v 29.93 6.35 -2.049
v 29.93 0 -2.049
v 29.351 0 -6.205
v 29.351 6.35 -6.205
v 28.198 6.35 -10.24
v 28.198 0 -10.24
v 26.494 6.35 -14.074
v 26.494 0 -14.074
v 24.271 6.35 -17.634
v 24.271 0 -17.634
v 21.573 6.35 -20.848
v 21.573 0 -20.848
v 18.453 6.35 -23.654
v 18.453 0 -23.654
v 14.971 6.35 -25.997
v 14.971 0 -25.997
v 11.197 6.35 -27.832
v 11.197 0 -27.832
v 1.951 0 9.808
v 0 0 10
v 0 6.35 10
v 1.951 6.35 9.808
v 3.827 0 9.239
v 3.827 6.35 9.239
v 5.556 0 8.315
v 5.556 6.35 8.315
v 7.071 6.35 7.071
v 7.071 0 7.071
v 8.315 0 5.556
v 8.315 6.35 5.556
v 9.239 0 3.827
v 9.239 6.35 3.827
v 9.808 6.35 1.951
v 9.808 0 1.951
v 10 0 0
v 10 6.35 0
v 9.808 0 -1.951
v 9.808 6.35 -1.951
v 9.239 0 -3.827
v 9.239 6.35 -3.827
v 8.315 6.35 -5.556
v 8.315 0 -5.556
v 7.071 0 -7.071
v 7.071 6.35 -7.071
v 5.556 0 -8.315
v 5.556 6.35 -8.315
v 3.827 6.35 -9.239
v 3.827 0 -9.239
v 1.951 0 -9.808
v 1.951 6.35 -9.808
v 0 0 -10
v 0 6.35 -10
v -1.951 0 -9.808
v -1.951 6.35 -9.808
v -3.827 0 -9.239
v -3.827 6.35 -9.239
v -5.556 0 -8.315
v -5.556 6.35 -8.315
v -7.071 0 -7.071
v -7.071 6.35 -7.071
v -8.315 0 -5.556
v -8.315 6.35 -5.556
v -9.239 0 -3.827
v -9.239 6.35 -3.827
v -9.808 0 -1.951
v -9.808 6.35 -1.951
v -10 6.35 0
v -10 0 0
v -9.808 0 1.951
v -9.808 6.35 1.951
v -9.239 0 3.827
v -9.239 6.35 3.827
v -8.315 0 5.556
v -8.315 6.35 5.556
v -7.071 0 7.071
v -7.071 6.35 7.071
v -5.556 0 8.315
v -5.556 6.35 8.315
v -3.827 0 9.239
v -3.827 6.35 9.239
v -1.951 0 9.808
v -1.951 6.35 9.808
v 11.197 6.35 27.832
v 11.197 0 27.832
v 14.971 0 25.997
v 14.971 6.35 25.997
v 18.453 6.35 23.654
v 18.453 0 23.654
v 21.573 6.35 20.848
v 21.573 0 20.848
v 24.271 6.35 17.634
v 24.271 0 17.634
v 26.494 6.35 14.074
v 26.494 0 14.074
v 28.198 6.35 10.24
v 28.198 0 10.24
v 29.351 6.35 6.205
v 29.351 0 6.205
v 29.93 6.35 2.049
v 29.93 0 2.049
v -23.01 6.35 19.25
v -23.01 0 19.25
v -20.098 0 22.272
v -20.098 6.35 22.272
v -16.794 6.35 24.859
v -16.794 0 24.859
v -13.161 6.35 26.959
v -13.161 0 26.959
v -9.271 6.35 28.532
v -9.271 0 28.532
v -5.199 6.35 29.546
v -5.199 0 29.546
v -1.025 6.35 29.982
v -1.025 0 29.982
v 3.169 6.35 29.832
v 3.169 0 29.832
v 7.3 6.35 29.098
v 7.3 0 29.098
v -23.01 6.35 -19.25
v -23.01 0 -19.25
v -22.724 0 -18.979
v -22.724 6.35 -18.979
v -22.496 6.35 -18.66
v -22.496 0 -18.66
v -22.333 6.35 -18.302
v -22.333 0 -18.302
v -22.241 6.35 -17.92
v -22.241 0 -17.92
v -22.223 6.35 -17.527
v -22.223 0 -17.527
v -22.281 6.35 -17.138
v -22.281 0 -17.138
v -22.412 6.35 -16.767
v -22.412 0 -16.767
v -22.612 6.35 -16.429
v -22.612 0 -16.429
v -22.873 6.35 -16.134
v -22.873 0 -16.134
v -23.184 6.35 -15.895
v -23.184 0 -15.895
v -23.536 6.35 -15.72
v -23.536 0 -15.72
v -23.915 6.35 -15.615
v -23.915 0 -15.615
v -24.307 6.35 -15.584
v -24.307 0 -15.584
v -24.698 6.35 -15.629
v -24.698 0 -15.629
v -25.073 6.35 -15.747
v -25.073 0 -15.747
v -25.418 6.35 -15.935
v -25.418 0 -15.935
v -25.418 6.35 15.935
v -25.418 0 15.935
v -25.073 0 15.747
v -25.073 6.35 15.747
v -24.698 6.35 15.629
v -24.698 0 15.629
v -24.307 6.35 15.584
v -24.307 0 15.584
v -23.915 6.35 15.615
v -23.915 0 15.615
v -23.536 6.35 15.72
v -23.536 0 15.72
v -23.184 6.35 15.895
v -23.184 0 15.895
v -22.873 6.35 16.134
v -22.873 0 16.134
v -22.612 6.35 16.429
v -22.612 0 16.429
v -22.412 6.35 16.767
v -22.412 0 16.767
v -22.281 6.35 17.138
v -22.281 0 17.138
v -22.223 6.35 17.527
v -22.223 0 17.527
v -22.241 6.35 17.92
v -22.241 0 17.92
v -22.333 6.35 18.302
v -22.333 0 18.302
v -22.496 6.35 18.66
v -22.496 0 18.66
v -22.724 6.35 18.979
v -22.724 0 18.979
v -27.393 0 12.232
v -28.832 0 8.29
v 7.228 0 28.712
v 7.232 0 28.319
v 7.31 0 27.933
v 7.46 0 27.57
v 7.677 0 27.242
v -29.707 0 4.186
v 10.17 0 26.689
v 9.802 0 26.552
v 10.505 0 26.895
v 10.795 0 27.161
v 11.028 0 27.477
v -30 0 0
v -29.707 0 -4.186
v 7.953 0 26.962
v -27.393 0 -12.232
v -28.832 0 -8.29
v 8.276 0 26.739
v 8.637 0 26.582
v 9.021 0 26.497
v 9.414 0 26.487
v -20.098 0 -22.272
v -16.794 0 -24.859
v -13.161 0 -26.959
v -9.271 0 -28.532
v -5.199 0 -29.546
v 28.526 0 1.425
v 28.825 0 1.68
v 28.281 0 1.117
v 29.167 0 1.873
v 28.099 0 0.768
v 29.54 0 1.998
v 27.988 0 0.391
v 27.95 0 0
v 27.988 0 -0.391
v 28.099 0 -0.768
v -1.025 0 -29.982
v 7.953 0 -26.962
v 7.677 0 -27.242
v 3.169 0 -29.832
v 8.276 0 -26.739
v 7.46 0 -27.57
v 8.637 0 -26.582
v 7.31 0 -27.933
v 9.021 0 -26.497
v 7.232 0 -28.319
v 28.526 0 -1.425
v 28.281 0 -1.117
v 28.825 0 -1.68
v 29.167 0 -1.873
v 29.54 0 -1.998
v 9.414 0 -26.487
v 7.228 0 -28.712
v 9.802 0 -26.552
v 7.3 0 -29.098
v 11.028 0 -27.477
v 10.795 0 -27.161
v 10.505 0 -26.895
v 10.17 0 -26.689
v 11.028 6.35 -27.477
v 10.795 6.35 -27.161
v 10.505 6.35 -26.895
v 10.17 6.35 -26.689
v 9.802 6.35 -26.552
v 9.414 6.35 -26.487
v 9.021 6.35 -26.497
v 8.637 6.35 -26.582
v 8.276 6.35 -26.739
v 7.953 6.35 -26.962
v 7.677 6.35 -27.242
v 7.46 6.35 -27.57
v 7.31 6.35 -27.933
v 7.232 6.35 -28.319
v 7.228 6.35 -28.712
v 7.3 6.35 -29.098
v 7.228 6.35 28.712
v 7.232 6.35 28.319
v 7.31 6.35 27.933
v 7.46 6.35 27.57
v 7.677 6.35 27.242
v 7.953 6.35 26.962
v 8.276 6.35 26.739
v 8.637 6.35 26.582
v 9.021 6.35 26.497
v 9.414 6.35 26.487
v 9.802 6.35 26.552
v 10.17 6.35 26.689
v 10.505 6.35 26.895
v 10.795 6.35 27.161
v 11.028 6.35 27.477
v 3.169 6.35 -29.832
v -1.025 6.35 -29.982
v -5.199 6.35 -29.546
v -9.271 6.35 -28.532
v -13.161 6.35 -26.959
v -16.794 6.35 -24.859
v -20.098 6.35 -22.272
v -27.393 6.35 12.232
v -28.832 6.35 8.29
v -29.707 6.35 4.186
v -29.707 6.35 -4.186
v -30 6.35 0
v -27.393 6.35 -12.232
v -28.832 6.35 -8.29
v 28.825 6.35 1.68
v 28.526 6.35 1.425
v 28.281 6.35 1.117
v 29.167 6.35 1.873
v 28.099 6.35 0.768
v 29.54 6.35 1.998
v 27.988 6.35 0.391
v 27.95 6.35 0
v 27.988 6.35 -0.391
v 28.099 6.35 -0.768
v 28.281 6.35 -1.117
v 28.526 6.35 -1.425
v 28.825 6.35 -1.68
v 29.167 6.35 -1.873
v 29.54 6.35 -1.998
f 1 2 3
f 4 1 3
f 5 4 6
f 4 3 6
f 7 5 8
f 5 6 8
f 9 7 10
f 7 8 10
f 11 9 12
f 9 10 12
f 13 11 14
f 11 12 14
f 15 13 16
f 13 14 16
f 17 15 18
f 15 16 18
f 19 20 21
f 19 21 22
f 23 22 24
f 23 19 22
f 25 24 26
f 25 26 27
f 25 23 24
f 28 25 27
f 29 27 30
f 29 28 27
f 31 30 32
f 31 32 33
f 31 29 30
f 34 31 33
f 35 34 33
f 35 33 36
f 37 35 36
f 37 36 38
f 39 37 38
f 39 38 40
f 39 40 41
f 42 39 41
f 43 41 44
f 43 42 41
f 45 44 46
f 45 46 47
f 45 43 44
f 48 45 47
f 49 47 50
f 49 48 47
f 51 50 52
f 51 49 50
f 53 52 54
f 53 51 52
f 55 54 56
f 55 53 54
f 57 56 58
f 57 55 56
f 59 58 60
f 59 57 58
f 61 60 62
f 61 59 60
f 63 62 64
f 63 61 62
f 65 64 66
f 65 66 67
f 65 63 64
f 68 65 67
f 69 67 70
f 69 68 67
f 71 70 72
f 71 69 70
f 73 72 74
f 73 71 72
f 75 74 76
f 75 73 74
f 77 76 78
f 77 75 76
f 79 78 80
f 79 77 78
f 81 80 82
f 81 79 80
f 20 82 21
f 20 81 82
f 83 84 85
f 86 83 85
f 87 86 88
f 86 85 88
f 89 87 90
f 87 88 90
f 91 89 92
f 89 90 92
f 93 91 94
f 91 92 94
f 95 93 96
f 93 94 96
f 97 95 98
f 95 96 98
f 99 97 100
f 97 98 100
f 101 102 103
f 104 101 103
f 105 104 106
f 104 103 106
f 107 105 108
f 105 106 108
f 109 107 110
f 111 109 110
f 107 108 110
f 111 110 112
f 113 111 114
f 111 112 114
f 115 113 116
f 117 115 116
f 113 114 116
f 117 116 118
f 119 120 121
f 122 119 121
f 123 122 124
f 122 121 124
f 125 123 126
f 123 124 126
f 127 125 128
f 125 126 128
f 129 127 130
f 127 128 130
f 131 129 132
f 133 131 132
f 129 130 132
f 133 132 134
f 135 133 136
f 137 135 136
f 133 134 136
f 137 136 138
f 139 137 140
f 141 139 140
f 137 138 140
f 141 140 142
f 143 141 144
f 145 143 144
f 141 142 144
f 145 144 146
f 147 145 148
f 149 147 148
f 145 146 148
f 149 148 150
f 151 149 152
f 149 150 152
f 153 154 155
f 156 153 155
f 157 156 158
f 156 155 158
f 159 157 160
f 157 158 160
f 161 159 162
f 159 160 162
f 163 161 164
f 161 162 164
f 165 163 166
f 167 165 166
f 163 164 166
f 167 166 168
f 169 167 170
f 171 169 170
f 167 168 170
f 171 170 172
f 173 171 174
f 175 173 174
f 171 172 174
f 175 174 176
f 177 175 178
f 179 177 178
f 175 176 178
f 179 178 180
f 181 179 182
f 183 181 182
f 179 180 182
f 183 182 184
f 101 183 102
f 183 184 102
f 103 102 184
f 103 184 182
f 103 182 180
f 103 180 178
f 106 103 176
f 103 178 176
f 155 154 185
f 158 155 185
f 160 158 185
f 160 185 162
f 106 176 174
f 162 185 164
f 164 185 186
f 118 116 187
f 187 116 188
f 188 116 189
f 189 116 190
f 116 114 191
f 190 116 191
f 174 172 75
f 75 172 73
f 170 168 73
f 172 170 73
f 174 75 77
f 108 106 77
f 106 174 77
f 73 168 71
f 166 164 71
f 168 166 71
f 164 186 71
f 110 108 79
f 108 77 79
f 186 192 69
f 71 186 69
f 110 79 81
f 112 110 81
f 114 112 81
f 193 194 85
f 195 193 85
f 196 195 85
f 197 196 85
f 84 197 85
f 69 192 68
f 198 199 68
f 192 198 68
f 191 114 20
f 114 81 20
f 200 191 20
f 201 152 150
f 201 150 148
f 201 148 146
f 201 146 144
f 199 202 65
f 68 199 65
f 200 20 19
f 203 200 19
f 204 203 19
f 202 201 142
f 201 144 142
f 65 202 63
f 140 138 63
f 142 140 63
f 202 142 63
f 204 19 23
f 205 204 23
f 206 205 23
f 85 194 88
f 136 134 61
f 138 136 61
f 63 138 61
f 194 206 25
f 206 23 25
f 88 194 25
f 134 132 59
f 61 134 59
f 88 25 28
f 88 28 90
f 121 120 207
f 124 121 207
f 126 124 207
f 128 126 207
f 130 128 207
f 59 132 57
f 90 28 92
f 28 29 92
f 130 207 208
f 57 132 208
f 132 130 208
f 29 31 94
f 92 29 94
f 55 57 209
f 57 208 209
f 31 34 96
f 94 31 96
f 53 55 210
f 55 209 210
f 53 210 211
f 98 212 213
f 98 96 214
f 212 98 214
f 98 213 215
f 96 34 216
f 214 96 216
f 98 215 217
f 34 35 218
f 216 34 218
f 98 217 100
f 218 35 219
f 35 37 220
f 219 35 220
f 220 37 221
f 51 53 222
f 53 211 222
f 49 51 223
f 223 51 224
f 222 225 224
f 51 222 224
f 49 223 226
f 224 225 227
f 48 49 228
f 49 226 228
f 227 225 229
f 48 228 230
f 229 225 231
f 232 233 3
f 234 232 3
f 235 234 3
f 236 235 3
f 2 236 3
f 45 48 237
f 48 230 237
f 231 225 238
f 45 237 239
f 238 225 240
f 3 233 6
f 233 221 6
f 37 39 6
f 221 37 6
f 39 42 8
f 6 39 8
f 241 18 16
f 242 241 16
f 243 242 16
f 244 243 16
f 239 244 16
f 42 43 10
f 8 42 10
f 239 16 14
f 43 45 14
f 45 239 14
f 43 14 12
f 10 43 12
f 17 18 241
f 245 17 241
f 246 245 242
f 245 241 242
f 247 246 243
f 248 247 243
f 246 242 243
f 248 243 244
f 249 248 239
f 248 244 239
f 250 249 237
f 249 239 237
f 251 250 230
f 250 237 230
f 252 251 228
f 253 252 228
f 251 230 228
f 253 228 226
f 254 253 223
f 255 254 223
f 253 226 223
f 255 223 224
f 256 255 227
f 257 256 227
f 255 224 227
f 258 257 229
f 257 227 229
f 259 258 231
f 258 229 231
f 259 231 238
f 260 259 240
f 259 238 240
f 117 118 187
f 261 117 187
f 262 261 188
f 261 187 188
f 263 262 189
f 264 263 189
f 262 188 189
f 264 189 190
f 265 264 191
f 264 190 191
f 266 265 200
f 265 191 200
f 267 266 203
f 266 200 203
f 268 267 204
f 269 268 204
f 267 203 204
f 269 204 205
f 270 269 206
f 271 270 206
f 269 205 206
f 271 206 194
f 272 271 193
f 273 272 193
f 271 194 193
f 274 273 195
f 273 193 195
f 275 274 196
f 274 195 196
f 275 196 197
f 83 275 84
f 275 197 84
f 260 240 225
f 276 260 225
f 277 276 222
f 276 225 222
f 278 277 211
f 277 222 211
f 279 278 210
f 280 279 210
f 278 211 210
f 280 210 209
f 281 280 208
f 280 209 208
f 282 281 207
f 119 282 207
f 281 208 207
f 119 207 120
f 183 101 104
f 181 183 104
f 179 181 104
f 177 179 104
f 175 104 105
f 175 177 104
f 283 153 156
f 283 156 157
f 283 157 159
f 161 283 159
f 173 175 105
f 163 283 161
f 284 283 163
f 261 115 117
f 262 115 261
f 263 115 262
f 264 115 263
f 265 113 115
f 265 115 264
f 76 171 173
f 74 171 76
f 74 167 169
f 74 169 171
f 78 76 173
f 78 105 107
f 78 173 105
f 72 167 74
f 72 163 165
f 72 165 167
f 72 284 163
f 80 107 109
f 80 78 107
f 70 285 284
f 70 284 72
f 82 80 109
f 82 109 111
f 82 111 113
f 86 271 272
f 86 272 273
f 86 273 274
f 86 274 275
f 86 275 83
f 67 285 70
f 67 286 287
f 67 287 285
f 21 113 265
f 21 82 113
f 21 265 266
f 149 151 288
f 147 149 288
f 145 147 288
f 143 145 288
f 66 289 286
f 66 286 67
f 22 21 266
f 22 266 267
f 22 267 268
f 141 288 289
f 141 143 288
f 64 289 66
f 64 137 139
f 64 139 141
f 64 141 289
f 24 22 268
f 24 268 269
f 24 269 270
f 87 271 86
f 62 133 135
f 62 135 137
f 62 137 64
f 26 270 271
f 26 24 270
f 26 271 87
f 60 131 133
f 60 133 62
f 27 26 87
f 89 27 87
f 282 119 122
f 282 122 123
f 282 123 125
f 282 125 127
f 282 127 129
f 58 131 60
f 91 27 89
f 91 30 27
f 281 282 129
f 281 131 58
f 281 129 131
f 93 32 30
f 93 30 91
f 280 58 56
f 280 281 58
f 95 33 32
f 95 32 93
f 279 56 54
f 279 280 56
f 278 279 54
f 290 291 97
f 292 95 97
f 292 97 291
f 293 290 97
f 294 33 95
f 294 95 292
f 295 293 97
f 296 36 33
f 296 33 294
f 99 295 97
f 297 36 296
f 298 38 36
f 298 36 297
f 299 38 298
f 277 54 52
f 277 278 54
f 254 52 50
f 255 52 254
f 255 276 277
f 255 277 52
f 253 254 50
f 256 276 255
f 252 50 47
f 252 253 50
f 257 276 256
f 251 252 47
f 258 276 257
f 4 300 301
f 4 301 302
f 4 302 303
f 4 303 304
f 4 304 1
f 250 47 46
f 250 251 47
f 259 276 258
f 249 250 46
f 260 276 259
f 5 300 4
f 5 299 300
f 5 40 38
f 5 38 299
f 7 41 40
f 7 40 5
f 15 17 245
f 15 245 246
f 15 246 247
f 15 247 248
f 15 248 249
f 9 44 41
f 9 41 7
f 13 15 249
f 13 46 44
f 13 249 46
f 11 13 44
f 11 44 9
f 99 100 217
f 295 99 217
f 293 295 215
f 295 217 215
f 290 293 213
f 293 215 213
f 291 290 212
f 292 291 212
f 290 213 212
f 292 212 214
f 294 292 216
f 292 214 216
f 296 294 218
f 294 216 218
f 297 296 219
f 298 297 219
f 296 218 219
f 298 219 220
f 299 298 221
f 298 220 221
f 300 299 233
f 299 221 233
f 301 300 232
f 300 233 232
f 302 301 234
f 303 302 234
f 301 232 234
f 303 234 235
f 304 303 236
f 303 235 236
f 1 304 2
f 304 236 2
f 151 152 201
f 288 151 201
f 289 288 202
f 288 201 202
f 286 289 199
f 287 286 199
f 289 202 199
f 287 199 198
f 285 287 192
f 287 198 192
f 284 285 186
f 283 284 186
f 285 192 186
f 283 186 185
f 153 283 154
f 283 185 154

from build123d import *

# Parameters (mm, degrees)
SKETCH1_R           = 10
BOSS_EXTRUDE1_DEPTH = 6.35


with BuildPart() as part:
    # Sketch1 → Boss-Extrude1 (new body)
    with BuildSketch(Plane(origin=(0, 0, 0), x_dir=(1, 0, 0), z_dir=(0, 1, 0))):
        with BuildLine():
            ThreePointArc((29.929958333, 2.048803105), (24.270509831, 17.633557569), (11.19739331, 27.831966928))
            ThreePointArc((11.19739331, 27.831966928), (8.637024993, 26.58202963), (7.300338222, 29.098196883))
            ThreePointArc((7.300338222, 29.098196883), (-9.270509831, 28.531695489), (-23.009588682, 19.249904641))
            ThreePointArc((-23.009588682, 19.249904641), (-22.612024993, 16.428597802), (-25.418101183, 15.93487158))
            ThreePointArc((-25.418101183, 15.93487158), (-30, 0), (-25.418101183, -15.93487158))
            ThreePointArc((-25.418101183, -15.93487158), (-22.612024993, -16.428597802), (-23.009588682, -19.249904641))
            ThreePointArc((-23.009588682, -19.249904641), (-9.270509831, -28.531695489), (7.300338222, -29.098196883))
            ThreePointArc((7.300338222, -29.098196883), (8.637024993, -26.58202963), (11.19739331, -27.831966928))
            ThreePointArc((11.19739331, -27.831966928), (24.270509831, -17.633557569), (29.929958333, -2.048803105))
            ThreePointArc((29.929958333, -2.048803105), (27.95, 0), (29.929958333, 2.048803105))
        make_face()
        with Locations(Location((0, 0, 0), (0, 0, 270))):
            Circle(SKETCH1_R, mode=Mode.SUBTRACT)
    extrude(amount=BOSS_EXTRUDE1_DEPTH)


solid = part.part
